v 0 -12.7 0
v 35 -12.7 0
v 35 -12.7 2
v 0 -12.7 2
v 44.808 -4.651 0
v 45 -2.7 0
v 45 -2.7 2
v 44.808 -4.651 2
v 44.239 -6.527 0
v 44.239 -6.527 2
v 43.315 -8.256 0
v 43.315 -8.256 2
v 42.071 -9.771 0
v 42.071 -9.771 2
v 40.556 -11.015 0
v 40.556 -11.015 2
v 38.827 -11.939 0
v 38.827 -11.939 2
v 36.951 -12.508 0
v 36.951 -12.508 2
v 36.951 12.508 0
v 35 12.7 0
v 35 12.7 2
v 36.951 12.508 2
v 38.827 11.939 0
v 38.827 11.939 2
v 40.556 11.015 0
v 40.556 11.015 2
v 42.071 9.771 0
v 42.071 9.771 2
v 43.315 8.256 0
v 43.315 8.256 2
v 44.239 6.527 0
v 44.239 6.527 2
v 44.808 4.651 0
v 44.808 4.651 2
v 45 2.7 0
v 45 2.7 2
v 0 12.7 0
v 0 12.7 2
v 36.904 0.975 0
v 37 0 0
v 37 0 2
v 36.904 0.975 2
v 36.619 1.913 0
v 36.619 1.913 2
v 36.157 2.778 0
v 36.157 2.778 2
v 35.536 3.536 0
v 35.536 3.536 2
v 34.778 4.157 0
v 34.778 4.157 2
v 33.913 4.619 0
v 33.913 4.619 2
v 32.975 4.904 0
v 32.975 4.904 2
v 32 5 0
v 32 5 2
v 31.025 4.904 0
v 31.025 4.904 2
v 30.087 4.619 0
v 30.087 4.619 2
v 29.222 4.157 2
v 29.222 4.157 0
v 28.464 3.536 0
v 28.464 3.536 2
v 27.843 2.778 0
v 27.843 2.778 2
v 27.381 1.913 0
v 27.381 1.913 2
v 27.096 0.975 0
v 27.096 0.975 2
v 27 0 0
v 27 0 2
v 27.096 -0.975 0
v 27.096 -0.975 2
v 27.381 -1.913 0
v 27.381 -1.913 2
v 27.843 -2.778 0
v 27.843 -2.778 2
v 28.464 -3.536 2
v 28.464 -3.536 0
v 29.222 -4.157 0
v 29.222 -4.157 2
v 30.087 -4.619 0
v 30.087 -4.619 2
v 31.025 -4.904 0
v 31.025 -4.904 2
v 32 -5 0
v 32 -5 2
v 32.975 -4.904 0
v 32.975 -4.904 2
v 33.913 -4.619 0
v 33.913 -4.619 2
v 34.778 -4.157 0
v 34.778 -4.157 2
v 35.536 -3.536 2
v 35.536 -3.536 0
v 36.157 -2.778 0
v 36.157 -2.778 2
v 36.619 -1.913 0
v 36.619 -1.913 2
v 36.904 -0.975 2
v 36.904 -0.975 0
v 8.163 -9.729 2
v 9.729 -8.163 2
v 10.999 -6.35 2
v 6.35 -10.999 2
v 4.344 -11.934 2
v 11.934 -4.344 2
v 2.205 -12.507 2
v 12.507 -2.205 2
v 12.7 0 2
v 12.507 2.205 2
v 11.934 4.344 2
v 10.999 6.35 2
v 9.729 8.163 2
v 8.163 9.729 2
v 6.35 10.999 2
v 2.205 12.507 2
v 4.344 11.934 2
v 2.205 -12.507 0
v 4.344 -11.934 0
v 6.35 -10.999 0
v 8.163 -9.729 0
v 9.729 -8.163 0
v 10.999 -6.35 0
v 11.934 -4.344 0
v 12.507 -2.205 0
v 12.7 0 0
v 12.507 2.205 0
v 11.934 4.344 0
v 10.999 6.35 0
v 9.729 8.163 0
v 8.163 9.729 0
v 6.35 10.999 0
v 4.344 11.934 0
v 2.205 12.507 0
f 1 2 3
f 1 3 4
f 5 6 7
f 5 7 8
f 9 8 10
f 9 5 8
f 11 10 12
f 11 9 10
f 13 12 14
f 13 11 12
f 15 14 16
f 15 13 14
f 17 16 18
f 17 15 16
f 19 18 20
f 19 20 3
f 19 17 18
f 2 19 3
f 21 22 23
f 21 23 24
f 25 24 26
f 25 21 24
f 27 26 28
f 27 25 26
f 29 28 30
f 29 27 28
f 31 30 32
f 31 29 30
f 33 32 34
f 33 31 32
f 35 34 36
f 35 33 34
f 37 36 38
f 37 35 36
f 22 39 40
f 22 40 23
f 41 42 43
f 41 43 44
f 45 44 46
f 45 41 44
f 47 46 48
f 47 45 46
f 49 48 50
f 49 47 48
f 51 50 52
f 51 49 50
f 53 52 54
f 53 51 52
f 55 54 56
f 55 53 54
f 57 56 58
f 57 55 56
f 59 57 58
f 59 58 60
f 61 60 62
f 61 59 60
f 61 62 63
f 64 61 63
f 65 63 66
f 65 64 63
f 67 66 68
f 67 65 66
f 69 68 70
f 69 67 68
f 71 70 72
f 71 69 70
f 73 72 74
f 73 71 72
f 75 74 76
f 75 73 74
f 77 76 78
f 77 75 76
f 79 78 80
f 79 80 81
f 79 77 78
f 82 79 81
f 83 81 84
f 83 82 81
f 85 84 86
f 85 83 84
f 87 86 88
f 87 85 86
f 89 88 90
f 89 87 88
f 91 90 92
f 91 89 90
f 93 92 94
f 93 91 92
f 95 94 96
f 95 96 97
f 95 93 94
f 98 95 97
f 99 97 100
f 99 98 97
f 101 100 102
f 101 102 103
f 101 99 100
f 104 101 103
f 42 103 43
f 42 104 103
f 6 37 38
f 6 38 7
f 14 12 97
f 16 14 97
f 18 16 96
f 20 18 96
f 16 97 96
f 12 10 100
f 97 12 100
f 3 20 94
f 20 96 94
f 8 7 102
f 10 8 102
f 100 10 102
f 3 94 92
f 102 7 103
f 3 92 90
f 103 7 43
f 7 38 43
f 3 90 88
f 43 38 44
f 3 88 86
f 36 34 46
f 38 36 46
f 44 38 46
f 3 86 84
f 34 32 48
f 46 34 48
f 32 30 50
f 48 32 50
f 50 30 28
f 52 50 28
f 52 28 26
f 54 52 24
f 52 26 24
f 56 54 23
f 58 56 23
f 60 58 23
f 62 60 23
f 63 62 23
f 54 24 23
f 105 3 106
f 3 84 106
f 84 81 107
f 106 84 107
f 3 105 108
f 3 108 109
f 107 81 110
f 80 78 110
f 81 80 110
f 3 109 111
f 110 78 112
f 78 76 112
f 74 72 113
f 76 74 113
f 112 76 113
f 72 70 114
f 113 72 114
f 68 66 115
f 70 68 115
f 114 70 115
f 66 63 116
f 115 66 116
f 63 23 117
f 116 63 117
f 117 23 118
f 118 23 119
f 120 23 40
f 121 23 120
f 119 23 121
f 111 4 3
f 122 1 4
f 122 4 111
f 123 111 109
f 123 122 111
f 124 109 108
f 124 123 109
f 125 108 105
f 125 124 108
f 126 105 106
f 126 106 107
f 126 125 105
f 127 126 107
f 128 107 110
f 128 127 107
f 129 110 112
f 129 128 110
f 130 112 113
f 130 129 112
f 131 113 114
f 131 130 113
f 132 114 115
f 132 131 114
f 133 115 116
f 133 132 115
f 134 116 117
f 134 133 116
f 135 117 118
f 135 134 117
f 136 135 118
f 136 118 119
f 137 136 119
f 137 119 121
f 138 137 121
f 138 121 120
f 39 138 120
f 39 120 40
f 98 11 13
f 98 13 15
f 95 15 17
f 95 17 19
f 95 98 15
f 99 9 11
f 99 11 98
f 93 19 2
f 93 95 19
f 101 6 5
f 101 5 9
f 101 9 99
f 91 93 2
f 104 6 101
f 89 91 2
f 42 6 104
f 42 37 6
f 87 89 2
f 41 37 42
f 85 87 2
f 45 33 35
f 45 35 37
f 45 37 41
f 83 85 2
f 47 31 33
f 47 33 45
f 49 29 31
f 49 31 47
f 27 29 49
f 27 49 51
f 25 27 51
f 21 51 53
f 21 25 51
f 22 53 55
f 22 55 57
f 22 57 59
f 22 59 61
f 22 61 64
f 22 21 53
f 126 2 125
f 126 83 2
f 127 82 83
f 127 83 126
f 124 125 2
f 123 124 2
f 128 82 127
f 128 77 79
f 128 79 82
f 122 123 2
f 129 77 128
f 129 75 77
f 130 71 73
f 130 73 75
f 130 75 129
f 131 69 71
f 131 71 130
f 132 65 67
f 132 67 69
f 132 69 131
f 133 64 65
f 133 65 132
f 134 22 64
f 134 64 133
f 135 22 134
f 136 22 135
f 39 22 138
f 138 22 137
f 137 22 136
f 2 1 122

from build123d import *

# Parameters (mm, degrees)
SKETCH1_R           = 5
BOSS_EXTRUDE1_DEPTH = 2


with BuildPart() as part:
    # Sketch1 → Boss-Extrude1 (new body)
    with BuildSketch(Plane.XY):
        with BuildLine():
            Line((0, 12.7), (35, 12.7))
            ThreePointArc((35, 12.7), (42.071067812, 9.771067812), (45, 2.7))
            Line((45, 2.7), (45, -2.7))
            ThreePointArc((45, -2.7), (42.071067812, -9.771067812), (35, -12.7))
            Line((35, -12.7), (0, -12.7))
            ThreePointArc((0, -12.7), (12.7, 0), (0, 12.7))
        make_face()
        with Locations((32, 0)):
            Circle(SKETCH1_R, mode=Mode.SUBTRACT)
    extrude(amount=BOSS_EXTRUDE1_DEPTH)


solid = part.part
